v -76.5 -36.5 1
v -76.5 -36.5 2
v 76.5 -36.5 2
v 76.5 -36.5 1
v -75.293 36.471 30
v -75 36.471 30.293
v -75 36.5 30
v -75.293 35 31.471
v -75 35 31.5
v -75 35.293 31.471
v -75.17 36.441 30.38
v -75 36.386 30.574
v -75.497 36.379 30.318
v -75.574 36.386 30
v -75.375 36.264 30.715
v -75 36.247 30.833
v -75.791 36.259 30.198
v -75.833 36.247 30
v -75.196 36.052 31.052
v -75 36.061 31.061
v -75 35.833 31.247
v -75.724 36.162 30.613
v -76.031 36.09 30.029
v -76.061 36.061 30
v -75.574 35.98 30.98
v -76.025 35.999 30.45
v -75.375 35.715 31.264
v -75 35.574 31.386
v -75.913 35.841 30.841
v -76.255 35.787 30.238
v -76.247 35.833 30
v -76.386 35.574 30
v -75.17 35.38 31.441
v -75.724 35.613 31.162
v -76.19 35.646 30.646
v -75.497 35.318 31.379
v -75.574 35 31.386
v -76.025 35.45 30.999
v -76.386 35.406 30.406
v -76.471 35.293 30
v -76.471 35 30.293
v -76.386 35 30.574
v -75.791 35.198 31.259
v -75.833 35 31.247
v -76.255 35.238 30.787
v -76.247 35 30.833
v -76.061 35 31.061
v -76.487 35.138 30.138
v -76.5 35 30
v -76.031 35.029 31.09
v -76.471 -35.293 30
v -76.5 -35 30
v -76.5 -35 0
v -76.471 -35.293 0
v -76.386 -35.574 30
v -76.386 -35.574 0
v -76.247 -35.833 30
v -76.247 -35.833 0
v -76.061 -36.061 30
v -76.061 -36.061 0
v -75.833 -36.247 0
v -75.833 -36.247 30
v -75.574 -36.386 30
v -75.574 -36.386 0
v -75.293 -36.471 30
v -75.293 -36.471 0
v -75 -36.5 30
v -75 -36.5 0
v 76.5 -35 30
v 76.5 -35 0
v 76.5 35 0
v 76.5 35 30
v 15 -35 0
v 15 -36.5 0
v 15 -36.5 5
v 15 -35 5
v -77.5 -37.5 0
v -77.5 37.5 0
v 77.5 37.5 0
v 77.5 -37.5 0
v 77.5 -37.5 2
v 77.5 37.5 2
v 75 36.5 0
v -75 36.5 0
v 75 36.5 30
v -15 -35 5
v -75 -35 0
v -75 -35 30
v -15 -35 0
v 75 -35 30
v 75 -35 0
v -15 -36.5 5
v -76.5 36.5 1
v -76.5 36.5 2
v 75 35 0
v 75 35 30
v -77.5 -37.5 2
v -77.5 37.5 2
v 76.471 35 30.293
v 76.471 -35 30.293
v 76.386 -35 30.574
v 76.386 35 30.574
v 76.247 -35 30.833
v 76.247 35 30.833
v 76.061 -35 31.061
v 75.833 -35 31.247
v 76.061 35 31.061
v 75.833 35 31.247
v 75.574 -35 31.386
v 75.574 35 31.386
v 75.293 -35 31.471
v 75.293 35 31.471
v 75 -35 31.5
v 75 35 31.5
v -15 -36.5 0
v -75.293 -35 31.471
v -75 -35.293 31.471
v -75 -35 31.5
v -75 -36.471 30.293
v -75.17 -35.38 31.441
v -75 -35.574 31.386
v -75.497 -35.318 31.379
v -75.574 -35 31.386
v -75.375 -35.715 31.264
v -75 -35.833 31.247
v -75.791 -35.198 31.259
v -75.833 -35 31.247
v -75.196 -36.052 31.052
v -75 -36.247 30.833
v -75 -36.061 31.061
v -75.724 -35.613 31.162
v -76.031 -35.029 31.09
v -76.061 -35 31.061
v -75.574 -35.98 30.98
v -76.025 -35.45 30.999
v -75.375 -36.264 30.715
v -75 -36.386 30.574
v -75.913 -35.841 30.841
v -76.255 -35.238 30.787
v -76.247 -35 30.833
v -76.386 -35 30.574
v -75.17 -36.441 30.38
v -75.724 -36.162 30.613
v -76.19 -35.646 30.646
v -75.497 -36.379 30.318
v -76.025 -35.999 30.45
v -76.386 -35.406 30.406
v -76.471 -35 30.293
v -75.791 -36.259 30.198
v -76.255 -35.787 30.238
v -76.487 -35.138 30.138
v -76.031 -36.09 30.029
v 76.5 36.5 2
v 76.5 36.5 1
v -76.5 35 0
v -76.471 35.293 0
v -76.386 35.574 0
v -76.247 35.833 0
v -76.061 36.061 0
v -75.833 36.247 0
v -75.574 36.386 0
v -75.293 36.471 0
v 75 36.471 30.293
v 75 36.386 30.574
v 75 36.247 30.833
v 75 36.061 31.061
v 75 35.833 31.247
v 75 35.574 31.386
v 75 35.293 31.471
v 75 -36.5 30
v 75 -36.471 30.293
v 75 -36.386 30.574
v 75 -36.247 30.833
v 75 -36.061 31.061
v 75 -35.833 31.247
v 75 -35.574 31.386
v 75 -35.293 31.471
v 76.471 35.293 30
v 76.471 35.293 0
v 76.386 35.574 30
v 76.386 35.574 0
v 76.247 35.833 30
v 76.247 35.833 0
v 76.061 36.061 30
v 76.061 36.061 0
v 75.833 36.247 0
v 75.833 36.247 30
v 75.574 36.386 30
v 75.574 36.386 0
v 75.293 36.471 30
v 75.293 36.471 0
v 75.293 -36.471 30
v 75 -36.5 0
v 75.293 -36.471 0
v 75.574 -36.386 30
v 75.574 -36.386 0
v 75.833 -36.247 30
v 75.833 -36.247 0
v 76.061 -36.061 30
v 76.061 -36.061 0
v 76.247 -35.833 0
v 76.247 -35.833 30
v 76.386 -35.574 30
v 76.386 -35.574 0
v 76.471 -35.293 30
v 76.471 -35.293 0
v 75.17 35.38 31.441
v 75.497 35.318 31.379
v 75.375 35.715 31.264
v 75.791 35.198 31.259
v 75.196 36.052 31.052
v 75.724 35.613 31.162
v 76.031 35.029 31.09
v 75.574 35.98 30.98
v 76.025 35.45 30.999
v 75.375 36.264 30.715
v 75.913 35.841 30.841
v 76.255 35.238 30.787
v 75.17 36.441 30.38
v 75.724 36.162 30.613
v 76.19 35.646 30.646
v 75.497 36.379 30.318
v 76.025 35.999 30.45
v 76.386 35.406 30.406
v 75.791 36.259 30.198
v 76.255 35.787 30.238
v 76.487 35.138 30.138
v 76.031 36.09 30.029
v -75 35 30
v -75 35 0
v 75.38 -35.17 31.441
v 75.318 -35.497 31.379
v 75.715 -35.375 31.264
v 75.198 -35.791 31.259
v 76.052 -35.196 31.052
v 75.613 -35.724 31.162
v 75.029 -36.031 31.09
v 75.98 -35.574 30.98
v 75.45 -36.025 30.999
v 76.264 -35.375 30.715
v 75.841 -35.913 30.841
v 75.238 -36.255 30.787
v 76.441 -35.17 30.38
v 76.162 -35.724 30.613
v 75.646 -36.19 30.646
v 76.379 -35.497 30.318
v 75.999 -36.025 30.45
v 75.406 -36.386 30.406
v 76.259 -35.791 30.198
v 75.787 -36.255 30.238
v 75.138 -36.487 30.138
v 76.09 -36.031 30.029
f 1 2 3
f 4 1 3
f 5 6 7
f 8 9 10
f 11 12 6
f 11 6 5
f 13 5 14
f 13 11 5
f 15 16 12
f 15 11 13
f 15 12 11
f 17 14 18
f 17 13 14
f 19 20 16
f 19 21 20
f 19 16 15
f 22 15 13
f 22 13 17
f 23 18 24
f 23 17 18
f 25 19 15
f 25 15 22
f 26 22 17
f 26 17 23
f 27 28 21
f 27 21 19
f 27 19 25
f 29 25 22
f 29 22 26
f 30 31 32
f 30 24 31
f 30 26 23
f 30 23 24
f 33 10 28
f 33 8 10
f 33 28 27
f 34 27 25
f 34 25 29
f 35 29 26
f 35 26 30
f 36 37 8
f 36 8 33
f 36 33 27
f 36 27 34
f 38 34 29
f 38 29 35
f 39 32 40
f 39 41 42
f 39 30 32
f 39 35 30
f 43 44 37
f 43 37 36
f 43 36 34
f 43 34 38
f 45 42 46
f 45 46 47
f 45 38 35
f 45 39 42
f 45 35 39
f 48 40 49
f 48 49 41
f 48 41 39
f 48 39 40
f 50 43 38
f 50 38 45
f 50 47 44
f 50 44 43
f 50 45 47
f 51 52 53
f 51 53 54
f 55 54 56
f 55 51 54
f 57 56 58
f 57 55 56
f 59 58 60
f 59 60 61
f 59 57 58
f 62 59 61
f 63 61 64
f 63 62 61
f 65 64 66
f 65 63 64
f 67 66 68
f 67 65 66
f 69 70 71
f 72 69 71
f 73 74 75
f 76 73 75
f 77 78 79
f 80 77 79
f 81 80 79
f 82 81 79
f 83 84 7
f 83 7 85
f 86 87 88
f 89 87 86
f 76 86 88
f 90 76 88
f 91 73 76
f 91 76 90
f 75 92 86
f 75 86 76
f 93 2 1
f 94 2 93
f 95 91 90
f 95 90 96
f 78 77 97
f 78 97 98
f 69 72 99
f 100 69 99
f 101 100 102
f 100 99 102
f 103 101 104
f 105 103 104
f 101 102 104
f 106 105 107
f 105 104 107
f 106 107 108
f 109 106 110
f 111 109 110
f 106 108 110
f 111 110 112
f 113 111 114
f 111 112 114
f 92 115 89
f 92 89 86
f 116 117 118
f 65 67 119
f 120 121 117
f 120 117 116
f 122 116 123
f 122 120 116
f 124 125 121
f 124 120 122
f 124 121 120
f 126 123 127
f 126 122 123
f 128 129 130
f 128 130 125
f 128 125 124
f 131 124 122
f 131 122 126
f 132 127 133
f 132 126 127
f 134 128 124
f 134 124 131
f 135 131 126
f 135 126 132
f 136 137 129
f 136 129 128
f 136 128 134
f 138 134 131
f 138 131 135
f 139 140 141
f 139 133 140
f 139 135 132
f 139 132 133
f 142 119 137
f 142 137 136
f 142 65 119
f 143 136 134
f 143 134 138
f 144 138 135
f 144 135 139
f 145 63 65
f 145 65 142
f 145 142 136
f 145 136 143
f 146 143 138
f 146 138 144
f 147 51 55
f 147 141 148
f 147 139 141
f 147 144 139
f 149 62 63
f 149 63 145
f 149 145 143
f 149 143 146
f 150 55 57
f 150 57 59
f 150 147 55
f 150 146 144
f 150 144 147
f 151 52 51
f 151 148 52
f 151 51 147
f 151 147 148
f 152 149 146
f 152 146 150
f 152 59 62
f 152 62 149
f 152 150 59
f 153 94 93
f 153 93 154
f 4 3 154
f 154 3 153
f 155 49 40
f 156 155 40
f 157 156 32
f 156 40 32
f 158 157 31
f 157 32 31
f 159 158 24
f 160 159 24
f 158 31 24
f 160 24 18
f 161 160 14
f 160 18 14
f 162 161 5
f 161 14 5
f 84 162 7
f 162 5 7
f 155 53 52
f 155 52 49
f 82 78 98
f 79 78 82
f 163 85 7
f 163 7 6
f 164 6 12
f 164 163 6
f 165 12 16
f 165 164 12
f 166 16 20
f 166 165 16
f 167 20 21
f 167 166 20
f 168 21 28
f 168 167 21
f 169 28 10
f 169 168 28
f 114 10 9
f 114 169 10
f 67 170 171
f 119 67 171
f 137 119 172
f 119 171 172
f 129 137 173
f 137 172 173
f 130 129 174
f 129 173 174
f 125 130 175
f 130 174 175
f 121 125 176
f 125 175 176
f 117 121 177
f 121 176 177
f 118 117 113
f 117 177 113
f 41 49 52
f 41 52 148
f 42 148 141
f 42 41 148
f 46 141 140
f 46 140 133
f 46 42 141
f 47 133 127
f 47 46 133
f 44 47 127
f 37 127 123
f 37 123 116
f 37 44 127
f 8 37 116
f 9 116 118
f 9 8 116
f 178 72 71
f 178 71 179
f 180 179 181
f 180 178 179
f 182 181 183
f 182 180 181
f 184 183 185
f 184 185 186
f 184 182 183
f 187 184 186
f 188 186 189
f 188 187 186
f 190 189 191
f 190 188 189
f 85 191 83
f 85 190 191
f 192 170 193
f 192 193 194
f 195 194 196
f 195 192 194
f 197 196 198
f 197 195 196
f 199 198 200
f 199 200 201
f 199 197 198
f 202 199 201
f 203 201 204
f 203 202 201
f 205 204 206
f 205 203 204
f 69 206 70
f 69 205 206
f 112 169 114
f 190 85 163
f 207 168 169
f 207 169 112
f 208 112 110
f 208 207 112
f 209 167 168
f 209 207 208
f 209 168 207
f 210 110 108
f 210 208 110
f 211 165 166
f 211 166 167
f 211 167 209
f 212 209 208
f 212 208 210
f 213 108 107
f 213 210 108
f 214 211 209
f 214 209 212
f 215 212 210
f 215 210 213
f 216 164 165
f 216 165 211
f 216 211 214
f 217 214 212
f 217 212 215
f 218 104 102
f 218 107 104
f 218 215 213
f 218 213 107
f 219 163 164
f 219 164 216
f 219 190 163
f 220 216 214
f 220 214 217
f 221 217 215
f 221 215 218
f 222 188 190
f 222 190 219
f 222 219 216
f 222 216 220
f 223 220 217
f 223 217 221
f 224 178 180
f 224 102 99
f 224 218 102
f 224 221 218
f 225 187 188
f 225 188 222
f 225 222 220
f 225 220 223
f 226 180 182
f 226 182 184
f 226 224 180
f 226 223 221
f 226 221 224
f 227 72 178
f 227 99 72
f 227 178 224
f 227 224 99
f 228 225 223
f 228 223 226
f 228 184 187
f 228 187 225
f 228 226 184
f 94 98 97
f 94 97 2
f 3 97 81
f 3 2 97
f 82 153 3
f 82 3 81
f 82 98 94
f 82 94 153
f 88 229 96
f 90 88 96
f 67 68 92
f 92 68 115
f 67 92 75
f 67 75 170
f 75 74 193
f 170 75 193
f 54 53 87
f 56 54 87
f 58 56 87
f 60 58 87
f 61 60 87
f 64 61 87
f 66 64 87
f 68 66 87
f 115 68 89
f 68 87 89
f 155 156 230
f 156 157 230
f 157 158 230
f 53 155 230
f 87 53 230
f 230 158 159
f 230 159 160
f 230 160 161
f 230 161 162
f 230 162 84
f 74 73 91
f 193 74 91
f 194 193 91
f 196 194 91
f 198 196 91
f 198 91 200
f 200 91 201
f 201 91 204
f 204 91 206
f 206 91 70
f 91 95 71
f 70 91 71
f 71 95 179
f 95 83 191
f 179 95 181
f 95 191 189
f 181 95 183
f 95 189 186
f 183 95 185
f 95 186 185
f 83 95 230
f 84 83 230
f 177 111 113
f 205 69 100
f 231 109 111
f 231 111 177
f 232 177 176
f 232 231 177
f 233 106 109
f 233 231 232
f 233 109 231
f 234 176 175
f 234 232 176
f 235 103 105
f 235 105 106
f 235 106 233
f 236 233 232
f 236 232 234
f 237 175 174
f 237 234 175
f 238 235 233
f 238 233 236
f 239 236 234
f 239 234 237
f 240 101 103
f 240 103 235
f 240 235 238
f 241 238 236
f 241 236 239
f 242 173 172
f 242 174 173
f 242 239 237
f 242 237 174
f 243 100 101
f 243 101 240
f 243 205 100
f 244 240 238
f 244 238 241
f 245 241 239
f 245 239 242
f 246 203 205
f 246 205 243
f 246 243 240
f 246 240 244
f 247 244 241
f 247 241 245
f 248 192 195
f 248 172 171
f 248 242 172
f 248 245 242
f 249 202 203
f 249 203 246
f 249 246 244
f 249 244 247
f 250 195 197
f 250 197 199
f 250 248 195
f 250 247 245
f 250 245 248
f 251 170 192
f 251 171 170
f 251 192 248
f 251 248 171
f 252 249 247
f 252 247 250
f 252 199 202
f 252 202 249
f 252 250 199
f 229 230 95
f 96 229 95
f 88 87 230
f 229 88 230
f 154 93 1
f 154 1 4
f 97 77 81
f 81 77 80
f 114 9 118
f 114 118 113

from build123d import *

# Parameters (mm, degrees)
SKETCH001_W     = 155
SKETCH001_H     = 75
PAD001_DEPTH    = 2
SKETCH002_W     = 153
SKETCH002_H     = 73
POCKET_DEPTH    = 1
SKETCH_W        = 150
SKETCH_H        = 70
PAD_DEPTH       = 30
THICKNESS_T     = 1.5
SKETCH003_W     = 30
SKETCH003_H     = 5
POCKET001_DEPTH = 1.5


with BuildPart() as pocket_hole:
    # Sketch001 → Pad001 (new body)
    with BuildSketch(Plane.XY):
        Rectangle(SKETCH001_W, SKETCH001_H)
    extrude(amount=PAD001_DEPTH)

    # Sketch002 → Pocket (cut)
    with BuildSketch(Plane.XY.offset(2)):
        Rectangle(SKETCH002_W, SKETCH002_H)
    extrude(amount=-POCKET_DEPTH, mode=Mode.SUBTRACT)


with BuildPart() as cover_hole:
    # Sketch → Pad (new body)
    with BuildSketch(Plane.XY):
        Rectangle(SKETCH_W, SKETCH_H)
    extrude(amount=PAD_DEPTH)

    # Thickness
    thickness_openings = [cover_hole.faces().sort_by_distance(p)[0] for p in [
        (0, 0, 0),
    ]]
    offset(amount=THICKNESS_T, openings=thickness_openings)

    # Sketch003 → Pocket001 (cut)
    with BuildSketch(Plane.XZ.offset(36.5)):
        with Locations((0, 2.5)):
            Rectangle(SKETCH003_W, SKETCH003_H)
    extrude(amount=-POCKET001_DEPTH, mode=Mode.SUBTRACT)


solid = Compound([pocket_hole.part, cover_hole.part])
